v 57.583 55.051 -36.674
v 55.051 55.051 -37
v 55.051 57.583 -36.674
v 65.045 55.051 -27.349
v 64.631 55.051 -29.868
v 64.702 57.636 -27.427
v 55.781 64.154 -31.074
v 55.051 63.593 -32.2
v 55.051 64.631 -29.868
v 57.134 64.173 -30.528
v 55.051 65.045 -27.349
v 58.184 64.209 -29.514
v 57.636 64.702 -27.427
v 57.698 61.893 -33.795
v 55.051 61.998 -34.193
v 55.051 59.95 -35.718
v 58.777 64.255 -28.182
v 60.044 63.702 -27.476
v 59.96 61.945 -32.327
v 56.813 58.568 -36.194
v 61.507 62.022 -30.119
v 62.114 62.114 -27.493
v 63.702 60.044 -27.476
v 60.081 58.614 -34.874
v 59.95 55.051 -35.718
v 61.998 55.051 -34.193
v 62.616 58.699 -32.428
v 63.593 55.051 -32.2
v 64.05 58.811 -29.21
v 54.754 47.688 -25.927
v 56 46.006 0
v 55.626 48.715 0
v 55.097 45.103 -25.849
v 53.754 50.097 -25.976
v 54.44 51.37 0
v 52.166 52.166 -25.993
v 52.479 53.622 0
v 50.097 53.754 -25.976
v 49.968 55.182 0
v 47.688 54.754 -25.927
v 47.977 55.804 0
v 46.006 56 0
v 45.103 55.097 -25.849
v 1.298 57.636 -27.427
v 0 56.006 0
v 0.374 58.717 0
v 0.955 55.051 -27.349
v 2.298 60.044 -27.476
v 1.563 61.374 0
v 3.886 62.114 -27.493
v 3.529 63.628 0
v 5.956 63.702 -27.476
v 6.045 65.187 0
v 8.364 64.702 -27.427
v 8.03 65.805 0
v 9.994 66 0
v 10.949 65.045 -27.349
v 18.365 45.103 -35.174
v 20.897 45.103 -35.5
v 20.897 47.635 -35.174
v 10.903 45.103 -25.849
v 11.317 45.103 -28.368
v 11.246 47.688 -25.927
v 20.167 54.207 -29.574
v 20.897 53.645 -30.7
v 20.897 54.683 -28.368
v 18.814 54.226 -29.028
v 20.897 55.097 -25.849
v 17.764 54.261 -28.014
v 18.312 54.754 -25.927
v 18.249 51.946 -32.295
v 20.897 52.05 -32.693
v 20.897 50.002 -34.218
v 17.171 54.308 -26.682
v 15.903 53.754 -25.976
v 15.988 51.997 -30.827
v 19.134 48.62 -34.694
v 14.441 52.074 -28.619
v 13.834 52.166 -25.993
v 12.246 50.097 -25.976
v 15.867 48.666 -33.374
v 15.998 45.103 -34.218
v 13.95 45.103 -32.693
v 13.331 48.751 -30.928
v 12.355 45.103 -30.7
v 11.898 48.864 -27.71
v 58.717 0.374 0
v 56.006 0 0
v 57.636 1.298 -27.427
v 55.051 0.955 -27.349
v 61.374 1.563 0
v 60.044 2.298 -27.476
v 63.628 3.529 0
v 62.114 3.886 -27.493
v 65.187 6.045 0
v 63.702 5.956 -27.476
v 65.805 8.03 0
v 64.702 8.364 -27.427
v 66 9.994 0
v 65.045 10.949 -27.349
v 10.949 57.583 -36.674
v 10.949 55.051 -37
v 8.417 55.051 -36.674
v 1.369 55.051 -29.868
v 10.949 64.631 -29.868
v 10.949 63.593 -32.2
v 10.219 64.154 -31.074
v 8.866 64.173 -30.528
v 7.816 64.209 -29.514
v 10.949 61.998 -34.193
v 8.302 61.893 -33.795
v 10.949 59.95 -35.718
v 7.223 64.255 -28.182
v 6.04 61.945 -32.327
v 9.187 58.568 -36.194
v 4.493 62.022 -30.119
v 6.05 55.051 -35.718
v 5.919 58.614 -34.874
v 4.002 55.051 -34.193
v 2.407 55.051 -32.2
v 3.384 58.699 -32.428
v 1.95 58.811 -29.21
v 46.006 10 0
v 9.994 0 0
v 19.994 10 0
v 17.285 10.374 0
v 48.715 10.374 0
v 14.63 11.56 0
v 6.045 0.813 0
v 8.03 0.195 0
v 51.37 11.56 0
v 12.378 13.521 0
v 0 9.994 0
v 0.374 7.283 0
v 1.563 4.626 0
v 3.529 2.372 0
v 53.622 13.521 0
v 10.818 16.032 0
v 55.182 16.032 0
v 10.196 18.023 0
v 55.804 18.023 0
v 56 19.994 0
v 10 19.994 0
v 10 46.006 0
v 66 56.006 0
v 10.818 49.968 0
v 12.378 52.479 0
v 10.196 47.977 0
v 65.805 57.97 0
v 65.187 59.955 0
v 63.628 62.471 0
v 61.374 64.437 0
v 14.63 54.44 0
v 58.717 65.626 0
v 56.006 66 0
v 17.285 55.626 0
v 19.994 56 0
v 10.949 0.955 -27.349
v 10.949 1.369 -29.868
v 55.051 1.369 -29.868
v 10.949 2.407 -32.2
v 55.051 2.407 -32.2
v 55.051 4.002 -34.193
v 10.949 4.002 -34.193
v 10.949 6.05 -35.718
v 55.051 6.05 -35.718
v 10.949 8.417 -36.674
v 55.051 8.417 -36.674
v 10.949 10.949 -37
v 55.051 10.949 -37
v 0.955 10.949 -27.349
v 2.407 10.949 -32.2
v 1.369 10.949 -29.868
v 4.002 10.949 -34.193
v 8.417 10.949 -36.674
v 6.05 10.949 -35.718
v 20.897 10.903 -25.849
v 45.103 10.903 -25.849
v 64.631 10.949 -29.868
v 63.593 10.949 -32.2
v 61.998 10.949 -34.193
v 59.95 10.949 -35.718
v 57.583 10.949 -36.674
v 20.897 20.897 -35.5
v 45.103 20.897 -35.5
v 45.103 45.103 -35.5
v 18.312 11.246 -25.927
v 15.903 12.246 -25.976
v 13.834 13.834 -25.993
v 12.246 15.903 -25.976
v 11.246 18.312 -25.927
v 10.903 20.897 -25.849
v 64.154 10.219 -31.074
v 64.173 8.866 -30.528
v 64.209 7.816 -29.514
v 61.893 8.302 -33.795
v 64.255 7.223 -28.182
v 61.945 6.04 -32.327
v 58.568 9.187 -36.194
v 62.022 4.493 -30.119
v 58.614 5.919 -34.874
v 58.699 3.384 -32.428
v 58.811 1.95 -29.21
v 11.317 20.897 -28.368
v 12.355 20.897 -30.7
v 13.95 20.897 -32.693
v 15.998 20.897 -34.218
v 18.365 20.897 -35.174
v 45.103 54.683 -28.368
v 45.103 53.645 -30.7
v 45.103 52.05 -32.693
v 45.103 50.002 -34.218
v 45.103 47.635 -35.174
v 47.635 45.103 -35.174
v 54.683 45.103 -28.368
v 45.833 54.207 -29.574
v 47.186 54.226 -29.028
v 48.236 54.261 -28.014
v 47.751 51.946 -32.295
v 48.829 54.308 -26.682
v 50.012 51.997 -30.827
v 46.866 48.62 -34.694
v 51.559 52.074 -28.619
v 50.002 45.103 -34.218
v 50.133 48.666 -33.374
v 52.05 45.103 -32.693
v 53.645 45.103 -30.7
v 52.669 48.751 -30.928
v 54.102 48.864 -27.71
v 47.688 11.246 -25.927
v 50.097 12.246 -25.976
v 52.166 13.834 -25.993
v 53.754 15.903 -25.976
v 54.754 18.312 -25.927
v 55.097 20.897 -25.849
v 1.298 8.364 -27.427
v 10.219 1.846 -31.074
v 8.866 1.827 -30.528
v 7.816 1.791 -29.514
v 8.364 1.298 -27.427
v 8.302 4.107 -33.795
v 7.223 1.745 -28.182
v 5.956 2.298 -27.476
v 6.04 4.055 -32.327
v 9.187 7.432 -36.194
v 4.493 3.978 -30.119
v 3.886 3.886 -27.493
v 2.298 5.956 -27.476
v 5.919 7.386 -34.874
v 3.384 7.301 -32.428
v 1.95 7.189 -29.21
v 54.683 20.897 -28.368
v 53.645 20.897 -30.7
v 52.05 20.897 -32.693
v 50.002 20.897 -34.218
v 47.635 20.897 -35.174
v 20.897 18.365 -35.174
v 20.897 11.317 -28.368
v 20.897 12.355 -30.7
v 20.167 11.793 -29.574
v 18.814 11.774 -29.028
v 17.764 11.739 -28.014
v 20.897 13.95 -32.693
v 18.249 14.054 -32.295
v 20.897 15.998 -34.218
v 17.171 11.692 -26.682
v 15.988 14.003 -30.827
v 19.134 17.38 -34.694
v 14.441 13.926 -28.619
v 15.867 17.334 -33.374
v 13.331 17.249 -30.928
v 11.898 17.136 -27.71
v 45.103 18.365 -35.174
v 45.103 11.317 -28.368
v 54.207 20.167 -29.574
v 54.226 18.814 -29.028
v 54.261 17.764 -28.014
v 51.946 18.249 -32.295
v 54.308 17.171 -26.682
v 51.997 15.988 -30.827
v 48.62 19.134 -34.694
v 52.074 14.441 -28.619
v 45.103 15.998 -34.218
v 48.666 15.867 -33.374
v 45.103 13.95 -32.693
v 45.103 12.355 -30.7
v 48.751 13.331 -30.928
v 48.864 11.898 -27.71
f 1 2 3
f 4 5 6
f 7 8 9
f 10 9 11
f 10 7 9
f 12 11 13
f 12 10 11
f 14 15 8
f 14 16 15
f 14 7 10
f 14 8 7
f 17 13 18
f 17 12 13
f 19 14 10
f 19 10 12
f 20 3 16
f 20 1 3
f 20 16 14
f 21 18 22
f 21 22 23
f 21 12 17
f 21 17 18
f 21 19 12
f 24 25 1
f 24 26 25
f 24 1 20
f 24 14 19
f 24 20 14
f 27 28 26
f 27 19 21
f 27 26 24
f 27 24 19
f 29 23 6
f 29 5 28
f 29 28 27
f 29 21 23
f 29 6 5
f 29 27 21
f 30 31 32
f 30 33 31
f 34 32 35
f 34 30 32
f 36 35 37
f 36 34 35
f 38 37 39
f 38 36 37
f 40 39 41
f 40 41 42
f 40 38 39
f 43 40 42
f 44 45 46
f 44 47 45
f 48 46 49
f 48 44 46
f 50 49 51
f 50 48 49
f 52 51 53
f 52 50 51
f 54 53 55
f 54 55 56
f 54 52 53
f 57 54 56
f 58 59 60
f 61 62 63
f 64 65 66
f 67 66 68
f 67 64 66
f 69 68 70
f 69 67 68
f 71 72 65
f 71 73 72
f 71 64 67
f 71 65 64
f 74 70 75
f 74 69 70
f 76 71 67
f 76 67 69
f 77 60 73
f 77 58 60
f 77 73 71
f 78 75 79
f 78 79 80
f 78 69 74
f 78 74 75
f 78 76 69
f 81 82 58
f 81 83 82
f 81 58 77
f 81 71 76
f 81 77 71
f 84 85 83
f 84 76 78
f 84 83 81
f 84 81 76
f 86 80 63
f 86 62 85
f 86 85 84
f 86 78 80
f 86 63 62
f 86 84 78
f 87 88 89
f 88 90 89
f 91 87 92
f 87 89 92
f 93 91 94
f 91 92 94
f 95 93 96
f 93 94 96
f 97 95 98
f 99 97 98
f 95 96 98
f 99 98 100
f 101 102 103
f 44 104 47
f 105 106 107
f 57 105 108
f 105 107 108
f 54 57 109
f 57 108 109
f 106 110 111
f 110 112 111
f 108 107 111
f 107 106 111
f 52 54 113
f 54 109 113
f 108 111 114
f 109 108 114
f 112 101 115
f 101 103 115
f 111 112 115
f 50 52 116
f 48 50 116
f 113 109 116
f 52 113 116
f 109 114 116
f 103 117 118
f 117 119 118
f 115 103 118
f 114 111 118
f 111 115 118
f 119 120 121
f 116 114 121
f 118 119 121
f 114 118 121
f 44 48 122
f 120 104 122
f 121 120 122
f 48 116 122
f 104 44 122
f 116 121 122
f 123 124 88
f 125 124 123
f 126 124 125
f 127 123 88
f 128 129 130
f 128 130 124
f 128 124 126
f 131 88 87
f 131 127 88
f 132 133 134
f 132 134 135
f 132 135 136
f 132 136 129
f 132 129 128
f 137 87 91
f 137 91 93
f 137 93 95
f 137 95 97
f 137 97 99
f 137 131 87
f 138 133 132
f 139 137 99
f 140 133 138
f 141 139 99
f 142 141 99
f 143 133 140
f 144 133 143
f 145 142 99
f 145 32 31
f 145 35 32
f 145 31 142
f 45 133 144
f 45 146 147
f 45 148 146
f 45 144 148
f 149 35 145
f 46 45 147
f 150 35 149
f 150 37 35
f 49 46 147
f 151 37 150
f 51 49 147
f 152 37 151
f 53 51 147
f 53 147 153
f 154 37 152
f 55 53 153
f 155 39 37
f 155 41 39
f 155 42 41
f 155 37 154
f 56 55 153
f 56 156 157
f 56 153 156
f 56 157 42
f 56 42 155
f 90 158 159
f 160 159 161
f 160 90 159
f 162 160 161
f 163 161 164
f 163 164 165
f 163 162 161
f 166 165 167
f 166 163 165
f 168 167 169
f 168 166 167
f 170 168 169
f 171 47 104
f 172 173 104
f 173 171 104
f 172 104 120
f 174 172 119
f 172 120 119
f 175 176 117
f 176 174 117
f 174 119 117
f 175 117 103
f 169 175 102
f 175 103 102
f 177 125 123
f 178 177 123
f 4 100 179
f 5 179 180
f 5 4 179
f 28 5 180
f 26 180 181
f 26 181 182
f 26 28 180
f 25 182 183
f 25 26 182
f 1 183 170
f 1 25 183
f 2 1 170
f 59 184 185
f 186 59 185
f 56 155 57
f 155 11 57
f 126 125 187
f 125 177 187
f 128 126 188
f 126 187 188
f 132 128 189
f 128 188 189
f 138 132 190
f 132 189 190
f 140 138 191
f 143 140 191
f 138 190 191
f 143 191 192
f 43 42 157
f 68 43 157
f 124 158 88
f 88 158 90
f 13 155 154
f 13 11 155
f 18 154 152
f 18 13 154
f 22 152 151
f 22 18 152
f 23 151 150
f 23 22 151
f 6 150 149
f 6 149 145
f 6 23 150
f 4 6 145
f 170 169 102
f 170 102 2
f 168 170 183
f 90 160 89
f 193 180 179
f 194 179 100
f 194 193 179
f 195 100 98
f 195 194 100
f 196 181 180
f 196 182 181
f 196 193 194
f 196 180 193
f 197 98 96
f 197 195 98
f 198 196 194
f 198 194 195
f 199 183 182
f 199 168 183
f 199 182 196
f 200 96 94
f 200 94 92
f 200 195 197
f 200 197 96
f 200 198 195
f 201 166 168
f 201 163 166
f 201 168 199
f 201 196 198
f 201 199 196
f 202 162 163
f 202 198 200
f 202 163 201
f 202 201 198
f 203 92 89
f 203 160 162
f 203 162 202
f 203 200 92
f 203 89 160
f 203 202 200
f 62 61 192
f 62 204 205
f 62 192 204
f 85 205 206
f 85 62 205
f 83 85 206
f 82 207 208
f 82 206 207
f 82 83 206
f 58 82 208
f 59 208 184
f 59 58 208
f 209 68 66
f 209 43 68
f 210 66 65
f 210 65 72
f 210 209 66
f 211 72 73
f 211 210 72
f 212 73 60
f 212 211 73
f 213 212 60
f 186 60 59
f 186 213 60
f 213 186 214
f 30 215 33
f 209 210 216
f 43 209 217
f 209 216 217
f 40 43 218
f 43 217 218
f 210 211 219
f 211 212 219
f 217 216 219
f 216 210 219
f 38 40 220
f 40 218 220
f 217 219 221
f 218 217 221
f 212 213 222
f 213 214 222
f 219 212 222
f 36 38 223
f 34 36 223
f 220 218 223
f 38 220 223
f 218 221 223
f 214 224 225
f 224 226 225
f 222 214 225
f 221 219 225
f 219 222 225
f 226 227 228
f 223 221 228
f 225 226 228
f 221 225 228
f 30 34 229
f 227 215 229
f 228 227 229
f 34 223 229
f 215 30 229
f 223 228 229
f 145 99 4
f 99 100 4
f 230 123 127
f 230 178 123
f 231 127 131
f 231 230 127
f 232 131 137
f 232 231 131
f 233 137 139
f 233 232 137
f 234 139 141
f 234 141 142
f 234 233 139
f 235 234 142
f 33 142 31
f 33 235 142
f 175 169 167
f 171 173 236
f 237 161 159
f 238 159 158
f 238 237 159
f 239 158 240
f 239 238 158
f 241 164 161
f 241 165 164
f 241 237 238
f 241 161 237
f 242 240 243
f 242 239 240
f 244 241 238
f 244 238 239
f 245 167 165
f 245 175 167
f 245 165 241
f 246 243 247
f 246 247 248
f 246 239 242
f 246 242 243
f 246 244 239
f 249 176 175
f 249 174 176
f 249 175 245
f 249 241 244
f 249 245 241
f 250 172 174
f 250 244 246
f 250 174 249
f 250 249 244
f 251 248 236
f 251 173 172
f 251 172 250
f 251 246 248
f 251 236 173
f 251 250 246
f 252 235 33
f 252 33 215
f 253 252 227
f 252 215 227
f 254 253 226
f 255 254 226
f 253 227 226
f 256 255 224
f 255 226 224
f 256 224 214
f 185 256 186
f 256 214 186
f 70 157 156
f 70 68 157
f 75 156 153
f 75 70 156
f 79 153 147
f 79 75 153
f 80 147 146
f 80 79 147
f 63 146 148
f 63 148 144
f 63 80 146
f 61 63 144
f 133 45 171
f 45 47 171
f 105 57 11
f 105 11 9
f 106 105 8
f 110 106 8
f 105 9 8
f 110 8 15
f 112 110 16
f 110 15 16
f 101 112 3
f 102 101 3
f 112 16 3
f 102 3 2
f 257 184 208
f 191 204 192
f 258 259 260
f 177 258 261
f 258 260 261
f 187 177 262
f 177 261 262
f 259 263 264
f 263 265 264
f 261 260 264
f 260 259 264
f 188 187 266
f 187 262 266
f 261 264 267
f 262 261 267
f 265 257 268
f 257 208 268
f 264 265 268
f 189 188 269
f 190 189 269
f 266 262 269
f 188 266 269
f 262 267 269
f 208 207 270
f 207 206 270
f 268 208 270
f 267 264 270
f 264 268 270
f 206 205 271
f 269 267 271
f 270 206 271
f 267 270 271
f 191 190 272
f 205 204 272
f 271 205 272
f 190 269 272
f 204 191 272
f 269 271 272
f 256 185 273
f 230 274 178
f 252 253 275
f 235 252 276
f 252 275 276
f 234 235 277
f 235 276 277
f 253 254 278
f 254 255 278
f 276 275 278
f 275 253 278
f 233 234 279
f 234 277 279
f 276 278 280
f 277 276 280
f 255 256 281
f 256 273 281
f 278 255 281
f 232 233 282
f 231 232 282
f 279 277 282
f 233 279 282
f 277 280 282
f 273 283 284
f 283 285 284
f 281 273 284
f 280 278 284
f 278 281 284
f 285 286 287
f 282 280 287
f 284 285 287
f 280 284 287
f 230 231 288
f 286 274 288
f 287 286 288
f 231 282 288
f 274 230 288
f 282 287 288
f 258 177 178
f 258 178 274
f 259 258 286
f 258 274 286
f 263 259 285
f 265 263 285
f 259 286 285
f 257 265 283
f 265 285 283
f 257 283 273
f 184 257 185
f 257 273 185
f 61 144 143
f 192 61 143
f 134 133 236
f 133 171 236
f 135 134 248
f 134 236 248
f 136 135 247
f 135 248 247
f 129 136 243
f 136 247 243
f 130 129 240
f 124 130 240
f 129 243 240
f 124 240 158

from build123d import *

# Parameters (mm, degrees)
F0_W     = 66
F0_H     = 66
F0_W_2   = 46
F0_H_2   = 46
F1_DEPTH = 37
F1_TAPER = 2
F2_DEPTH = 35.5
F2_TAPER = 2
F3_R     = 10
F4_R     = 10


with BuildPart() as f1:
    # F0 (on Top) → F1 (new body)
    with BuildSketch(Plane.XY):
        with Locations((33, 33)):
            Rectangle(F0_W, F0_H)
        with Locations((33, 33)):
            Rectangle(F0_W_2, F0_H_2, mode=Mode.SUBTRACT)
        with Locations((33, 33)):
            Rectangle(F0_W_2, F0_H_2)
    extrude(amount=-F1_DEPTH, taper=F1_TAPER)

    # F0 (on Top) → F2 (cut)
    with BuildSketch(Plane.XY):
        with Locations((33, 33)):
            Rectangle(F0_W_2, F0_H_2)
    extrude(amount=-F2_DEPTH, taper=F2_TAPER, mode=Mode.SUBTRACT)

    # F3
    f3_edges = [f1.edges().sort_by_distance(p)[0] for p in [
        (11.239687, 33, -35.5),
        (33, 11.239687, -35.5),
        (54.760313, 33, -35.5),
        (33, 54.760313, -35.5),
        (55.380156, 10.619844, -17.75),
        (10.619844, 55.380156, -17.75),
        (10.619844, 10.619844, -17.75),
        (55.380156, 55.380156, -17.75),
    ]]
    fillet(f3_edges, radius=F3_R)

    # F4
    f4_edges = [f1.edges().sort_by_distance(p)[0] for p in [
        (1.292068, 33, -37),
        (33, 1.292068, -37),
        (64.707932, 33, -37),
        (33, 64.707932, -37),
        (65.353966, 65.353966, -18.5),
        (0.646034, 65.353966, -18.5),
        (0.646034, 0.646034, -18.5),
        (65.353966, 0.646034, -18.5),
    ]]
    fillet(f4_edges, radius=F4_R)


solid = f1.part
